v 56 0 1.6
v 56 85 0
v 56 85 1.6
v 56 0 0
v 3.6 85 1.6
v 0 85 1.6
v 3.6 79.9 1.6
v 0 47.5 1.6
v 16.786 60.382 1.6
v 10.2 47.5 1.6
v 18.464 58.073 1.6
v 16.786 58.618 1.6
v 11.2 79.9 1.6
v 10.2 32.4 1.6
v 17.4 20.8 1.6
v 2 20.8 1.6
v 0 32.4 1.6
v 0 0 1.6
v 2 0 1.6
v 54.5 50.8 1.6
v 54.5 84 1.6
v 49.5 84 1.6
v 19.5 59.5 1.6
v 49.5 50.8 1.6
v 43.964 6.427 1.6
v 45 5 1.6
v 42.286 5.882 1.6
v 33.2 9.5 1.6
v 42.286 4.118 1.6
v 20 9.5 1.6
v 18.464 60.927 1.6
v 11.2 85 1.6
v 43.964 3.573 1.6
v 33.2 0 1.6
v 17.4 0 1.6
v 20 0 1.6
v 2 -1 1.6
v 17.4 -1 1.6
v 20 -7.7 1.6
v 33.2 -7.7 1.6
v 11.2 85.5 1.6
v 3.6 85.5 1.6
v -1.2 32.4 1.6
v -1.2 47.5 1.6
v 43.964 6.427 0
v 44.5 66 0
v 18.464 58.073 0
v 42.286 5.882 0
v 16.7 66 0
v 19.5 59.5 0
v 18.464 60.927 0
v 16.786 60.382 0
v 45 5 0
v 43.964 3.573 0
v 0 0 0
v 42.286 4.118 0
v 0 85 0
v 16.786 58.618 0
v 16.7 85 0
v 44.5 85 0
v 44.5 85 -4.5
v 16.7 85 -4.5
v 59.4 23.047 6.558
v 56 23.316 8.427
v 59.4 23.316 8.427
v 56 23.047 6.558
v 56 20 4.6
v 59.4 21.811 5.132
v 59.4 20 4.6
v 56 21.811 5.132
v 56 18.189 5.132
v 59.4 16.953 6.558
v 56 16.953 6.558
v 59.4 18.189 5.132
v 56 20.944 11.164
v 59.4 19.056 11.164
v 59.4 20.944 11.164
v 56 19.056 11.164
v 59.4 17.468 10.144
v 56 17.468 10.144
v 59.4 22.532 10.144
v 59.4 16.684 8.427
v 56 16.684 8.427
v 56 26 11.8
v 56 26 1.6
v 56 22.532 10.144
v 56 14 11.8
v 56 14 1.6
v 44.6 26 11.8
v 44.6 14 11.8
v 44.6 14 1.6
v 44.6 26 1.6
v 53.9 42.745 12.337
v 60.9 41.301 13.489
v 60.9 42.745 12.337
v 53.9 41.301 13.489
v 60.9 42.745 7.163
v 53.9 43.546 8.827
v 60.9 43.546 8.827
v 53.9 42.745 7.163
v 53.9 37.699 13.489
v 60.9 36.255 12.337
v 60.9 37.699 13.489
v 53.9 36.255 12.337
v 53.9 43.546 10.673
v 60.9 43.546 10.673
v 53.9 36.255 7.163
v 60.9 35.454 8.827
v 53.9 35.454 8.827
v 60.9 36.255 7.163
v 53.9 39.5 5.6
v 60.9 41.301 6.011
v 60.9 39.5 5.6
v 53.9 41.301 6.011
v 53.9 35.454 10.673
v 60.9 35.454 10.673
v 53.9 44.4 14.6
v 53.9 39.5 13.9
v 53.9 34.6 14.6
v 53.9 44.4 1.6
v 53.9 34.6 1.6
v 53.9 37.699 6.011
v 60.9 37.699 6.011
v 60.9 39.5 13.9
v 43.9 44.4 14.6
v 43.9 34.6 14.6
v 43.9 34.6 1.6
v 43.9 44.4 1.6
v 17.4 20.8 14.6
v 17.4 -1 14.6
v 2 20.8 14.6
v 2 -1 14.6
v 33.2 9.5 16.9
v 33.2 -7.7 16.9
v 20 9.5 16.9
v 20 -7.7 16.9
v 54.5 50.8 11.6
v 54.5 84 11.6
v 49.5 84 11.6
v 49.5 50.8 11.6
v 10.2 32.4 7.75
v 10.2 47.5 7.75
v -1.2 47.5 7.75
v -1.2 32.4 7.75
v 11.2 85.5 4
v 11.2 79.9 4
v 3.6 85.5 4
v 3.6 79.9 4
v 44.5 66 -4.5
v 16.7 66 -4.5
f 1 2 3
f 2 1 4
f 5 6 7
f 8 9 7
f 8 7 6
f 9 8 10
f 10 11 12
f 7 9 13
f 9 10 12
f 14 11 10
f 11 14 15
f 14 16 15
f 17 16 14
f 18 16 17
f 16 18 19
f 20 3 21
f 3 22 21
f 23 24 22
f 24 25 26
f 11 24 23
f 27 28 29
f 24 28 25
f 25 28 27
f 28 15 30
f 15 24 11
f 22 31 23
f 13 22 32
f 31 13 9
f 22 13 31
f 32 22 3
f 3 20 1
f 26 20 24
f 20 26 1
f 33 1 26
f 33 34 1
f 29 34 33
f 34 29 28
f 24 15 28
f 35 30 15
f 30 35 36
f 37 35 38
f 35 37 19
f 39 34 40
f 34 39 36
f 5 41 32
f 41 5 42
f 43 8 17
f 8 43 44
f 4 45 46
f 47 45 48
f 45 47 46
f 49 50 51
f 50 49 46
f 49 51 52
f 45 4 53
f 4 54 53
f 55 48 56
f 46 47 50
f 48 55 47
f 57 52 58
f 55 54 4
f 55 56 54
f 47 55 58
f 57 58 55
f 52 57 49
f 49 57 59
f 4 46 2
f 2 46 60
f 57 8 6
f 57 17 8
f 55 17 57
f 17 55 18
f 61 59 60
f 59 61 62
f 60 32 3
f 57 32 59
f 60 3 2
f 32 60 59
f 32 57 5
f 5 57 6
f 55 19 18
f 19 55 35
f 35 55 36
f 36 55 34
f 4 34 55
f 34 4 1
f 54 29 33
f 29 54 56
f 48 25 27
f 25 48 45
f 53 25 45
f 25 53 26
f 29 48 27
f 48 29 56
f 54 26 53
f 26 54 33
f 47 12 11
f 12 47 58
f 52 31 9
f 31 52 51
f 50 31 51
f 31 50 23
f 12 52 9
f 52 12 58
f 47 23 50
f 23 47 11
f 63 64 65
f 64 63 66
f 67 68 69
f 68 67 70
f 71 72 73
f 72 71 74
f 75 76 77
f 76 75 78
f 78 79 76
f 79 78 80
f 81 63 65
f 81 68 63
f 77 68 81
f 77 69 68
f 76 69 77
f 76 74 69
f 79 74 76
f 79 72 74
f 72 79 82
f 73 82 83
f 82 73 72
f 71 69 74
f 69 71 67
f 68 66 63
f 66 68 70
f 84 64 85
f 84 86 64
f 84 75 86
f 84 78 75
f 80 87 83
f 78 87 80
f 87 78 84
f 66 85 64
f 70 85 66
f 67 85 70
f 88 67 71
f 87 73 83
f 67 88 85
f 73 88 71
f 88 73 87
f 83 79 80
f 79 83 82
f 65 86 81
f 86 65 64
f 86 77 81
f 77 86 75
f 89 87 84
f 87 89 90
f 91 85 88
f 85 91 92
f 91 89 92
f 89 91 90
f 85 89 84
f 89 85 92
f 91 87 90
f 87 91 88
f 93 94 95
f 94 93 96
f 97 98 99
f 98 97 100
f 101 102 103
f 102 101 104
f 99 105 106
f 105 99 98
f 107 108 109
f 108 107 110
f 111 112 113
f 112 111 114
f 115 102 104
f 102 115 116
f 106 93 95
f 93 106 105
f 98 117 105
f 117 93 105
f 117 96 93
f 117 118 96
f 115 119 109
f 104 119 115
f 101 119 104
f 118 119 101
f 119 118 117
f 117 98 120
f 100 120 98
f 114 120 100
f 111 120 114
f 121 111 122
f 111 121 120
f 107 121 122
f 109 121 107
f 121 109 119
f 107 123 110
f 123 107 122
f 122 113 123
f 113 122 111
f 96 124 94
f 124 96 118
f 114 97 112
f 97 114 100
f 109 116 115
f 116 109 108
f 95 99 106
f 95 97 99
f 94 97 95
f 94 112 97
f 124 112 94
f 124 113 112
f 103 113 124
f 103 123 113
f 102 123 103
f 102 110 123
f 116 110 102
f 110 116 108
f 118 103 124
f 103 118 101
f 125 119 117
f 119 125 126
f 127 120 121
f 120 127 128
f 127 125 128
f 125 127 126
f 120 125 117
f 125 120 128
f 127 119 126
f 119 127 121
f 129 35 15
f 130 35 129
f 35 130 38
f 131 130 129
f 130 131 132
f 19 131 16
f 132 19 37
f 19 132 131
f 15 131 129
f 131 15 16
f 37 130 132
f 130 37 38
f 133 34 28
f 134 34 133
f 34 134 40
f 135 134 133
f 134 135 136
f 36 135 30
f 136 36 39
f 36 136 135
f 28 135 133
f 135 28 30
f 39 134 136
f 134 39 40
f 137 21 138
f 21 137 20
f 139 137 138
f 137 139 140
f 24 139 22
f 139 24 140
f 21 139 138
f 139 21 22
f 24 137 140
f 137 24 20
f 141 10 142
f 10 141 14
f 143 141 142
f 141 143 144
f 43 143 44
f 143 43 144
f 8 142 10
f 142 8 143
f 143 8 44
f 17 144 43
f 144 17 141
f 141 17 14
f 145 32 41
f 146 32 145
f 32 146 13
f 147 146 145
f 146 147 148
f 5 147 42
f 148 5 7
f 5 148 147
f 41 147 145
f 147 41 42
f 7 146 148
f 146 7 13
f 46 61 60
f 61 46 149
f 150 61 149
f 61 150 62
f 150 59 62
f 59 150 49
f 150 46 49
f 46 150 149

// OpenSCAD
module raspi()
{
	piwidth=56;
	pilength=85;
	piheight=1.6;
	mounthole=3;
	
	//the main board with holes
	difference()
	{
		cube([piwidth,pilength,piheight]);
		translate([piwidth-12.5,5,0])
		cylinder(h=piheight,r=mounthole/2);
		translate([18,pilength-25.5,0])
		cylinder(h=piheight,r=mounthole/2);
	}
	
	//the ethernet port
	ewidth=15.4;
	elength=21.8;
	eheight=13;
	translate([2,-1,piheight])
	cube([ewidth,elength,eheight]);
	
	//the usb ports
	uwidth=13.2;
	ulength=17.2;
	uheight=15.3;
	translate([piwidth-18.8-ulength,-7.7,piheight])
	cube([uwidth,ulength,uheight]);
	
	//the audio jack
	awidth=11.4;
	alength=12;
	aheight=10.2;
	adiam=6.7;
	aheight2=3.4;
	translate([piwidth-awidth,14,piheight])
	union()
	{
		translate([awidth,alength/2,adiam/2+3])
		rotate([0,90,0])
		cylinder(h=aheight2,r=adiam/2);
		cube([awidth,alength,aheight]);
	}
	
	//the video jack
	vwidth=10;
	vlength=9.8;
	vheight=13;
	vdiam=8.3;
	vheight2=7;
	translate([piwidth-vwidth-2.1,pilength-40.6-vlength,piheight])
	union()
	{
		translate([vwidth,vlength/2,vdiam/2+4])
		rotate([0,90,0])
		cylinder(h=vheight2,r=vdiam/2);
		cube([vwidth,vlength,vheight]);
	}
	
	//the gpio
	gwidth=5;
	glength=33.2;
	gheight=10;
	translate([piwidth-1.5-gwidth,pilength-1-glength,piheight])
	cube([gwidth,glength,gheight]);
	
	//the hdmi
	hwidth=11.4;
	hlength=15.1;
	hheight=6.15;
	translate([-1.2,pilength-37.5-hlength,piheight])
	cube([hwidth,hlength,hheight]);
	
	//the mini usb
	mwidth=7.6;
	mlength=5.6;
	mheight=2.4;
	translate([3.6,pilength+0.5-mlength,piheight])
	cube([mwidth,mlength,mheight]);
	
	//the sdcard slot
	swidth=27.8;
	slength=19;
	sheight=4.5;
	translate([piwidth-11.5-swidth,pilength-slength,-sheight])
	cube([swidth,slength,sheight]);
}

raspi();
